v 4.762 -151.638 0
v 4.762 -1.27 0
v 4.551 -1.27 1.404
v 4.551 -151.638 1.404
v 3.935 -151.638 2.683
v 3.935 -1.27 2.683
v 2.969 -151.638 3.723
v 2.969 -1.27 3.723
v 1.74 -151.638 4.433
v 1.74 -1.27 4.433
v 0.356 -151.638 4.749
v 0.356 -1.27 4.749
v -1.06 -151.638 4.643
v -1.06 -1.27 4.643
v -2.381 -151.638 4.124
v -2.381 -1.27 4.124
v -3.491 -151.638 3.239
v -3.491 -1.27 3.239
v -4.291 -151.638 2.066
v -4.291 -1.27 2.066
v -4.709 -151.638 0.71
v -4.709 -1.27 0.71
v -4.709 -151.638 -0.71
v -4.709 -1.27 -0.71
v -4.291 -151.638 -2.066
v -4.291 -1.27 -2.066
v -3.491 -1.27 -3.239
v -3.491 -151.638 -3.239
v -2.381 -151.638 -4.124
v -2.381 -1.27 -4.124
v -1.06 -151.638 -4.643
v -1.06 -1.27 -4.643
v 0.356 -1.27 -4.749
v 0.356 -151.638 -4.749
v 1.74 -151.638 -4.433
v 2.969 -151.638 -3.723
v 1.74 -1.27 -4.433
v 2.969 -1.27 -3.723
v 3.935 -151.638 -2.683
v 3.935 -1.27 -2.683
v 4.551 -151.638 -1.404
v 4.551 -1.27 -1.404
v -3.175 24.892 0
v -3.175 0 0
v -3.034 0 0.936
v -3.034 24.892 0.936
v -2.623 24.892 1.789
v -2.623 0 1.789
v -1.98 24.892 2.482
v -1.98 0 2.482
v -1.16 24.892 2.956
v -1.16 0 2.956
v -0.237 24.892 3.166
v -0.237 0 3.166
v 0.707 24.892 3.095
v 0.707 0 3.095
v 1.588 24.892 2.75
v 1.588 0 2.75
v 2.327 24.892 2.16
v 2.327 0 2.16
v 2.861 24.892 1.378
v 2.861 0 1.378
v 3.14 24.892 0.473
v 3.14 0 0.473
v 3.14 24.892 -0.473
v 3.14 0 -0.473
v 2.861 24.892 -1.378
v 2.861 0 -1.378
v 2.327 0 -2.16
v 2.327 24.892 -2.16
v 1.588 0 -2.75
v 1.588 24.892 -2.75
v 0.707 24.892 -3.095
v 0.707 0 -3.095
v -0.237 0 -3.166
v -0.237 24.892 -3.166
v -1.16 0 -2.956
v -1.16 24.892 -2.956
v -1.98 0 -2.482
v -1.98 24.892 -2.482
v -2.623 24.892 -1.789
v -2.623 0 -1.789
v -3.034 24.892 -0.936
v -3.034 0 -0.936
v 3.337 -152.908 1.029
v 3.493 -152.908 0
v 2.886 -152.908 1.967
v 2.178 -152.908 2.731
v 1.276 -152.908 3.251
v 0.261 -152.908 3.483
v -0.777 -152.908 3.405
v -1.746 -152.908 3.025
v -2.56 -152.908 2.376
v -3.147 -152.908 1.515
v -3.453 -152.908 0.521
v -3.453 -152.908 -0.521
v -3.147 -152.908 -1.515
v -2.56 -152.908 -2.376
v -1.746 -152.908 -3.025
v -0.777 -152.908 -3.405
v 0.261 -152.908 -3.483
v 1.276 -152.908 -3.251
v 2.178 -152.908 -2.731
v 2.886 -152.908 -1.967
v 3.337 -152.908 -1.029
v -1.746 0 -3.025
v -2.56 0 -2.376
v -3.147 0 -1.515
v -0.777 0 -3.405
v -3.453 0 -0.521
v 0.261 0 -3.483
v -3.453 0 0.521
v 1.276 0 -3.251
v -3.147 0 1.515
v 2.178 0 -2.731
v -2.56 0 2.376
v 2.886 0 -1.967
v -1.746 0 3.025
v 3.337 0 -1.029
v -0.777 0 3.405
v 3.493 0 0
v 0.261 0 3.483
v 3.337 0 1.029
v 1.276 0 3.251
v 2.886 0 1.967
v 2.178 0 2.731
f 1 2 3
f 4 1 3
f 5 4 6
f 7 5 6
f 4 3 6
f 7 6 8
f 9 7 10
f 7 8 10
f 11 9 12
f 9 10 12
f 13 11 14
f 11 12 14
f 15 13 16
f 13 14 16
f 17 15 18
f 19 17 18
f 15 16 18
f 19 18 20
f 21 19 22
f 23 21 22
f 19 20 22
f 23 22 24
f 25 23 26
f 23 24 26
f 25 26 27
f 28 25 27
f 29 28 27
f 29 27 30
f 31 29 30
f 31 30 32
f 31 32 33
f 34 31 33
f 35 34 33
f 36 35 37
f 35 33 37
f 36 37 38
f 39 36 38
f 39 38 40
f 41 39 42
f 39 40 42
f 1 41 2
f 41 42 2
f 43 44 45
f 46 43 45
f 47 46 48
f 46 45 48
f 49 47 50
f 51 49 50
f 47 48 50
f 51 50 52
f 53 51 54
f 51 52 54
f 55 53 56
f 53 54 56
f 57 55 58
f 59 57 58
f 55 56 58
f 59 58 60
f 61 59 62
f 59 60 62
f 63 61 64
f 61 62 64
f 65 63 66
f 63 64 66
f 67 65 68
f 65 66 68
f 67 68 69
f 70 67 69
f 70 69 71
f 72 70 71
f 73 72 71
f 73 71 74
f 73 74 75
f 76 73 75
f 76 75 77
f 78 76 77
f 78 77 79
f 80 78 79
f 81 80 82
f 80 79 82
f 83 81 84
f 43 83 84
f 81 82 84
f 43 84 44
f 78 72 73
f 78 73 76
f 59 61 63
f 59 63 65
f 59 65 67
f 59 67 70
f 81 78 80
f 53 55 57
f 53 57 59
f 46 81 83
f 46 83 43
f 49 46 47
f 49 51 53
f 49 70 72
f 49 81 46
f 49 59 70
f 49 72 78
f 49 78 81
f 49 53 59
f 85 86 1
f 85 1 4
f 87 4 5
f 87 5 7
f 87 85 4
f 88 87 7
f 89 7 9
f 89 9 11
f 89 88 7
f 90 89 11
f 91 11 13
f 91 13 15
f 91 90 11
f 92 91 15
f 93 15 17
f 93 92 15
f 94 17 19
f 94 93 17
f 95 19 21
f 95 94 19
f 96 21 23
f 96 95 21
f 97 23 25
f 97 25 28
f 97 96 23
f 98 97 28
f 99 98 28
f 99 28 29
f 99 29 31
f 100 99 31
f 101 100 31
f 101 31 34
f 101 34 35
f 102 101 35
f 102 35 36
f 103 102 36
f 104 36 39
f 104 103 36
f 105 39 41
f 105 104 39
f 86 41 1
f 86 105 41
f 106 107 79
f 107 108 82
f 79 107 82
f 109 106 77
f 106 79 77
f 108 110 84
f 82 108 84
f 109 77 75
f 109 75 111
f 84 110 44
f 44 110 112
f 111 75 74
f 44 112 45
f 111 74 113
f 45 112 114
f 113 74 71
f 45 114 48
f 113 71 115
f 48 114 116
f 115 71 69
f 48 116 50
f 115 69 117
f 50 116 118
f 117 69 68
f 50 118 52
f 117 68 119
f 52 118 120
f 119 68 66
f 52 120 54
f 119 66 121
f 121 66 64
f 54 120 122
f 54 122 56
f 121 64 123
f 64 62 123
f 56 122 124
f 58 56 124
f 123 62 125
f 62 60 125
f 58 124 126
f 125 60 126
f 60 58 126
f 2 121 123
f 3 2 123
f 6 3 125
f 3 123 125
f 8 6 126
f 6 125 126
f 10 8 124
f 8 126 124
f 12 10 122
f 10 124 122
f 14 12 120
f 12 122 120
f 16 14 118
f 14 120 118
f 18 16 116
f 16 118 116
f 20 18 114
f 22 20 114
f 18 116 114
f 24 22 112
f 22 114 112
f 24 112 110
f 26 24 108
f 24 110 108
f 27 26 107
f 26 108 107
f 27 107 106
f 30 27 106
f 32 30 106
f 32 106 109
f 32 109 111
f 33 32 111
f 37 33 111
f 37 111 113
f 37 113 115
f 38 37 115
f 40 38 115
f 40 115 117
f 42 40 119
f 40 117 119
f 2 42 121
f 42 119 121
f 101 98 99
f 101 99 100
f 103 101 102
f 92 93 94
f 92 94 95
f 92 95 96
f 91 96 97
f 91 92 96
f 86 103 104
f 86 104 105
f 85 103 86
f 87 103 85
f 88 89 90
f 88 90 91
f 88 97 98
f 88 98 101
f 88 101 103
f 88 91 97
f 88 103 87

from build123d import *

# Parameters (mm, degrees)
F0_R     = 4.7625
F1_DEPTH = 152.908
F2_SIZE2 = 1.27
F2_SIZE  = 1.27
F3_R     = 3.175
F4_DEPTH = 24.892


with BuildPart() as f1:
    # F0 (on Front) → F1 (new body)
    with BuildSketch(Plane.XZ):
        Circle(F0_R)
    extrude(amount=F1_DEPTH)

    # F2
    f2_edges = [f1.edges().sort_by_distance(p)[0] for p in [
        (-4.7625, -152.908, 0),
        (-4.7625, 0, 0),
    ]]
    chamfer(f2_edges, length=F2_SIZE, length2=F2_SIZE2)

    # F3 (on face) → F4 (join)
    with BuildSketch(Plane(origin=(0, 0, 0), x_dir=(-1, 0, 0), z_dir=(0, 1, 0))):
        Circle(F3_R)
    extrude(amount=F4_DEPTH)


solid = f1.part
